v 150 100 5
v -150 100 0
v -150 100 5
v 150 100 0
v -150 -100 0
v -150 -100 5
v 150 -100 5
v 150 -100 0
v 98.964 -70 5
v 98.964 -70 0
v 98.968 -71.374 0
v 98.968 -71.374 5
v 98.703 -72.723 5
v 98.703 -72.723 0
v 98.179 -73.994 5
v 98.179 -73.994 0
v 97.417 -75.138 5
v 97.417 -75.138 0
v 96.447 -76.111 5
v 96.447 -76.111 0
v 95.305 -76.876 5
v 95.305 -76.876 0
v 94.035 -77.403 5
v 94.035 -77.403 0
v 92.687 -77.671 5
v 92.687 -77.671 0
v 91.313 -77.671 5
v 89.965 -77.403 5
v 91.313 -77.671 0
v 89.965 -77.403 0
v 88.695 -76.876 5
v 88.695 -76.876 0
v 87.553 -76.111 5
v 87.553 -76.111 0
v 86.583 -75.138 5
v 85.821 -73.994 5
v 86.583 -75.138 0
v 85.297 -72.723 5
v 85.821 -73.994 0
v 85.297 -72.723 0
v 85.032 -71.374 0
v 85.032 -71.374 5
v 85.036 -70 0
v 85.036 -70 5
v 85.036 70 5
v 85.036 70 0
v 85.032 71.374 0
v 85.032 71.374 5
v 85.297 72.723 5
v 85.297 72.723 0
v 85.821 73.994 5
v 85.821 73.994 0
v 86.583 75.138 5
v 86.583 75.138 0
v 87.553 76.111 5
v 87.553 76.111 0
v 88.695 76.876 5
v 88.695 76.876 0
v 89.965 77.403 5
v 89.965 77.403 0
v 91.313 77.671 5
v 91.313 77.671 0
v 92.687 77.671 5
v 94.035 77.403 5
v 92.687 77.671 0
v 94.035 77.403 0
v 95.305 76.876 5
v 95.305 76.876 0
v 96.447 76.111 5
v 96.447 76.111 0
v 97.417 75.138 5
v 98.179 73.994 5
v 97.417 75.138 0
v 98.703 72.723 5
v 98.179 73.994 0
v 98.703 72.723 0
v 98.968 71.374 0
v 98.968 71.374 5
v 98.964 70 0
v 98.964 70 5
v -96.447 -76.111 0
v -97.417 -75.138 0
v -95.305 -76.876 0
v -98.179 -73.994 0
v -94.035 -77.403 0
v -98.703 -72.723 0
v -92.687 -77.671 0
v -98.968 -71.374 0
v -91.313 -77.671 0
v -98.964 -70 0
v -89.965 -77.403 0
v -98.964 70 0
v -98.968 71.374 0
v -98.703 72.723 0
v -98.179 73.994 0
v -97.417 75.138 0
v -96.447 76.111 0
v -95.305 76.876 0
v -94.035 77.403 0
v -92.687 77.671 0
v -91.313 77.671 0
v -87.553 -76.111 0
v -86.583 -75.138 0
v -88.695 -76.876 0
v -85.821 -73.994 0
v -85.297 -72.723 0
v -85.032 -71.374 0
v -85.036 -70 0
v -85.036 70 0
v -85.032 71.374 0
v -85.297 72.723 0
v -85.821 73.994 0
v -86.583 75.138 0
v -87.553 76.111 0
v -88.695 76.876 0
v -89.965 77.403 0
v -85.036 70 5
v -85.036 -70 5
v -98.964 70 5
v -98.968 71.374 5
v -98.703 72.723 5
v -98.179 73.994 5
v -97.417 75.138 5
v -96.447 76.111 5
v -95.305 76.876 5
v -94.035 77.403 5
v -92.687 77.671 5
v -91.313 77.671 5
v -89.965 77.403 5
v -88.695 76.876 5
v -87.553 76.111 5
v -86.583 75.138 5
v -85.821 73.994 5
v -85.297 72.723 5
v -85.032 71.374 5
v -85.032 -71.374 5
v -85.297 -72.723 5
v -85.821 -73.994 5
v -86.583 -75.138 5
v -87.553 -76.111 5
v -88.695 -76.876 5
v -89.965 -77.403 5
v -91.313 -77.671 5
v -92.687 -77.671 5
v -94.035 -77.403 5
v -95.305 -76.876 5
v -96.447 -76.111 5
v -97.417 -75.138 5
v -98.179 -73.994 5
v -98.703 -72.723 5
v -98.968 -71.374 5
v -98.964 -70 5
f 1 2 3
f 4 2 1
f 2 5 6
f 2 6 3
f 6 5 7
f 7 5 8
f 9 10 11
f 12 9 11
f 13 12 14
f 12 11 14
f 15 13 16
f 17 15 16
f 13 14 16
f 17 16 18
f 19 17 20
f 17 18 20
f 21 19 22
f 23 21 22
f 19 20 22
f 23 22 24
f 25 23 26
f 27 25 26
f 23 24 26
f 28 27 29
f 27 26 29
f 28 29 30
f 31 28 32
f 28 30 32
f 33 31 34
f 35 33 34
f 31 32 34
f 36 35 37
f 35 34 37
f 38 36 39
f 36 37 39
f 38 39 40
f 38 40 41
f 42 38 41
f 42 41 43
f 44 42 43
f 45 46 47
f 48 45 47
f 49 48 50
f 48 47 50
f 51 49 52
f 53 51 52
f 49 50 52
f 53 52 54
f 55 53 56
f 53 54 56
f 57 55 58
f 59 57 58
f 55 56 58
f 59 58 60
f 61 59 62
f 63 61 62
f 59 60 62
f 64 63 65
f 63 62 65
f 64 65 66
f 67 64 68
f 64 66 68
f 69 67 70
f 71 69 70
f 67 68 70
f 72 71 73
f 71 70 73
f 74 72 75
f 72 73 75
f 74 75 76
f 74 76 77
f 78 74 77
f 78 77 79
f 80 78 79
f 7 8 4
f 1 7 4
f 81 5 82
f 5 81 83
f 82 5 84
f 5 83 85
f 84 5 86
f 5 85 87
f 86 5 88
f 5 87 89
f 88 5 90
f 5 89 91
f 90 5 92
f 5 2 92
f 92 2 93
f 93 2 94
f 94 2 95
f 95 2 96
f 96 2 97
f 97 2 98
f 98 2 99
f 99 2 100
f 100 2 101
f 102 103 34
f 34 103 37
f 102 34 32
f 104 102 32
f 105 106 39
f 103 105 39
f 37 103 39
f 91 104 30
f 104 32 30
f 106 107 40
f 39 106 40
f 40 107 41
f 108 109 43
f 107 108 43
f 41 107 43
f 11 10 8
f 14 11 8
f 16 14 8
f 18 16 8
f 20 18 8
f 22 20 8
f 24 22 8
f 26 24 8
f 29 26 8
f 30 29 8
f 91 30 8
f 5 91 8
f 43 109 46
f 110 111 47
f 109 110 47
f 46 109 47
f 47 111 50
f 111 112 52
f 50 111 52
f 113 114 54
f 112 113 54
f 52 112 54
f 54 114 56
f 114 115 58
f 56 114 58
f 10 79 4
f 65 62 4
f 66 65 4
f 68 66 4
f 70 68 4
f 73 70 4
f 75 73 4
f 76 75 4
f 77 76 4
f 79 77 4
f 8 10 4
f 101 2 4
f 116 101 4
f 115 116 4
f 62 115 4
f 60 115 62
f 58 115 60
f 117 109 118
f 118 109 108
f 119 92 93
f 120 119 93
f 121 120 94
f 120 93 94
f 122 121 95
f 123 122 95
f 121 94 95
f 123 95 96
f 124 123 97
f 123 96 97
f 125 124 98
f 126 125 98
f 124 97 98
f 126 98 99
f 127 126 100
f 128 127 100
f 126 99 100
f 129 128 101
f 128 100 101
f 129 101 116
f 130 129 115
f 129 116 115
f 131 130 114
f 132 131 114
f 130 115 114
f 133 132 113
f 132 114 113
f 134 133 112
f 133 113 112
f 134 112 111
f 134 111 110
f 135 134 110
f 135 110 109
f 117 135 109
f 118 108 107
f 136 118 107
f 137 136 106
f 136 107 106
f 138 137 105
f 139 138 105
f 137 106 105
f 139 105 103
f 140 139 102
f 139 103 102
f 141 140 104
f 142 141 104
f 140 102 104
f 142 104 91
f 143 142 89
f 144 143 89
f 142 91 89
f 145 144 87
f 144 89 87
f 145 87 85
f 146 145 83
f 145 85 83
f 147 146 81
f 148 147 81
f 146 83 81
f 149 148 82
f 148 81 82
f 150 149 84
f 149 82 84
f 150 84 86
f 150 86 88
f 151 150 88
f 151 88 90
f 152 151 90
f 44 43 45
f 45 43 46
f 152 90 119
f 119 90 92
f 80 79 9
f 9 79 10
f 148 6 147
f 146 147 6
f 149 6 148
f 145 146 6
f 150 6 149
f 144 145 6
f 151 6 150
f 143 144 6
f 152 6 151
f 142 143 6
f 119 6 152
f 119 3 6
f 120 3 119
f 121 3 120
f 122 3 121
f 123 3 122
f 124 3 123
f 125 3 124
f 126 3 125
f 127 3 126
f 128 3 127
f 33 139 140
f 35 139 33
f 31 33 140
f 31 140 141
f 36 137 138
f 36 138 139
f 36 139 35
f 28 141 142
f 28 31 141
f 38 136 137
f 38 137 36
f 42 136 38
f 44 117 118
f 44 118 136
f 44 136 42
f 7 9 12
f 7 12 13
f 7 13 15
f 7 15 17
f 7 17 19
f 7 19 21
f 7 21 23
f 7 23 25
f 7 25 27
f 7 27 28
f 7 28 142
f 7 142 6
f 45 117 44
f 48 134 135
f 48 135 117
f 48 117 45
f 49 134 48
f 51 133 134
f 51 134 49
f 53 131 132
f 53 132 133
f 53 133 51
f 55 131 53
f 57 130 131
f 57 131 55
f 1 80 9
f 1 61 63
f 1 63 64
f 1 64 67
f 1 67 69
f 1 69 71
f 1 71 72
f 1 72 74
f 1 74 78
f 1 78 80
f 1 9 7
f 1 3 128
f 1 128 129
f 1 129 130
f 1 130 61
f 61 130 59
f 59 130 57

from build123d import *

# Parameters (mm, degrees)
F0_W     = 300
F0_H     = 200
F1_DEPTH = 5


with BuildPart() as f1:
    # F0 (on Top) → F1 (new body)
    with BuildSketch(Plane.XY):
        Rectangle(F0_W, F0_H)
        with BuildLine():
            ThreePointArc((98.964391, -70), (92, -77.705161), (85.035609, -70))
            Line((85.035609, -70), (85.035609, 70))
            ThreePointArc((85.035609, 70), (92, 77.705161), (98.964391, 70))
            Line((98.964391, 70), (98.964391, -70))
        make_face(mode=Mode.SUBTRACT)
        with BuildLine():
            Line((-85.035609, 70), (-85.035609, -70))
            ThreePointArc((-85.035609, -70), (-92, -77.705161), (-98.964391, -70))
            Line((-98.964391, -70), (-98.964391, 70))
            ThreePointArc((-98.964391, 70), (-92, 77.705161), (-85.035609, 70))
        make_face(mode=Mode.SUBTRACT)
    extrude(amount=F1_DEPTH)


solid = f1.part
